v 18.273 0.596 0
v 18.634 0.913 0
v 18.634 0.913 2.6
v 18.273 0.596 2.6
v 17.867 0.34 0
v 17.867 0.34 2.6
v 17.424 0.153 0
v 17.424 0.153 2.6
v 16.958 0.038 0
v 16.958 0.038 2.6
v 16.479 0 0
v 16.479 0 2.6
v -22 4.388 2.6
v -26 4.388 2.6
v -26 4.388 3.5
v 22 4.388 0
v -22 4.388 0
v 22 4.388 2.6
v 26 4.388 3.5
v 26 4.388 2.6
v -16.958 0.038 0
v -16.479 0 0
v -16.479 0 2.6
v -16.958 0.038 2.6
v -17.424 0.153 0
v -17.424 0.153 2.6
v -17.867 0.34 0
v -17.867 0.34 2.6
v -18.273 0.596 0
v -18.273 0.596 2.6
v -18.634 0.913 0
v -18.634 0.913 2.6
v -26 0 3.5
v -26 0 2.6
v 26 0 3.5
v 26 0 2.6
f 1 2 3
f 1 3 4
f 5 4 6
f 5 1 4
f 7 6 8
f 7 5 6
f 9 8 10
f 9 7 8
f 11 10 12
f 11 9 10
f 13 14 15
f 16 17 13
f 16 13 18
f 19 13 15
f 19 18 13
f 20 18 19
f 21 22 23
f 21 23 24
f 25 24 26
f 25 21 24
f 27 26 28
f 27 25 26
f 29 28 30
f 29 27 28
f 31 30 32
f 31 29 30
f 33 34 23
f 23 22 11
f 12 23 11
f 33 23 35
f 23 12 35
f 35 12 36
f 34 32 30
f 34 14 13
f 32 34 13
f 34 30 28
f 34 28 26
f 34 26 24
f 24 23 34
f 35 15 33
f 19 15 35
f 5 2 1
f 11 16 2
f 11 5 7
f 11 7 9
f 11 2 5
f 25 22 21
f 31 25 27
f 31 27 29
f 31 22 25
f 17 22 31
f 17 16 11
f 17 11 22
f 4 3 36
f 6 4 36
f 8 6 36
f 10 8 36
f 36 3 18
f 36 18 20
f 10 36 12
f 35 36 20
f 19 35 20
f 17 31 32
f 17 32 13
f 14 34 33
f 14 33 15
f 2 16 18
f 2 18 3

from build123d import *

# Parameters (mm, degrees)
Y_KSEKLIK_EKSTR_ZYON1_DEPTH = 2.6
IZIM2_W                     = 52
IZIM2_H                     = 4.388233566
Y_KSEKLIK_EKSTR_ZYON3_DEPTH = 0.9


with BuildPart() as part:
    # Çizim1 → Yükseklik-Ekstrüzyon1 (new body)
    with BuildSketch(Plane.XY):
        with BuildLine():
            Line((22, 4.388233566), (18.634136343, 0.912893359))
            ThreePointArc((18.634136343, 0.912893359), (17.649333458, 0.237635078), (16.479145422, 0))
            Line((16.479145422, 0), (-16.479145422, 0))
            ThreePointArc((-16.479145422, 0), (-17.649333458, 0.237635078), (-18.634136343, 0.912893359))
            Line((-18.634136343, 0.912893359), (-22, 4.388233566))
            Line((-22, 4.388233566), (22, 4.388233566))
        make_face()
    extrude(amount=Y_KSEKLIK_EKSTR_ZYON1_DEPTH)

    # Çizim2 → Yükseklik-Ekstrüzyon3 (add)
    with BuildSketch(Plane.XY.offset(2.6)):
        with Locations((0, 2.194116783)):
            Rectangle(IZIM2_W, IZIM2_H)
    extrude(amount=Y_KSEKLIK_EKSTR_ZYON3_DEPTH)


solid = part.part
